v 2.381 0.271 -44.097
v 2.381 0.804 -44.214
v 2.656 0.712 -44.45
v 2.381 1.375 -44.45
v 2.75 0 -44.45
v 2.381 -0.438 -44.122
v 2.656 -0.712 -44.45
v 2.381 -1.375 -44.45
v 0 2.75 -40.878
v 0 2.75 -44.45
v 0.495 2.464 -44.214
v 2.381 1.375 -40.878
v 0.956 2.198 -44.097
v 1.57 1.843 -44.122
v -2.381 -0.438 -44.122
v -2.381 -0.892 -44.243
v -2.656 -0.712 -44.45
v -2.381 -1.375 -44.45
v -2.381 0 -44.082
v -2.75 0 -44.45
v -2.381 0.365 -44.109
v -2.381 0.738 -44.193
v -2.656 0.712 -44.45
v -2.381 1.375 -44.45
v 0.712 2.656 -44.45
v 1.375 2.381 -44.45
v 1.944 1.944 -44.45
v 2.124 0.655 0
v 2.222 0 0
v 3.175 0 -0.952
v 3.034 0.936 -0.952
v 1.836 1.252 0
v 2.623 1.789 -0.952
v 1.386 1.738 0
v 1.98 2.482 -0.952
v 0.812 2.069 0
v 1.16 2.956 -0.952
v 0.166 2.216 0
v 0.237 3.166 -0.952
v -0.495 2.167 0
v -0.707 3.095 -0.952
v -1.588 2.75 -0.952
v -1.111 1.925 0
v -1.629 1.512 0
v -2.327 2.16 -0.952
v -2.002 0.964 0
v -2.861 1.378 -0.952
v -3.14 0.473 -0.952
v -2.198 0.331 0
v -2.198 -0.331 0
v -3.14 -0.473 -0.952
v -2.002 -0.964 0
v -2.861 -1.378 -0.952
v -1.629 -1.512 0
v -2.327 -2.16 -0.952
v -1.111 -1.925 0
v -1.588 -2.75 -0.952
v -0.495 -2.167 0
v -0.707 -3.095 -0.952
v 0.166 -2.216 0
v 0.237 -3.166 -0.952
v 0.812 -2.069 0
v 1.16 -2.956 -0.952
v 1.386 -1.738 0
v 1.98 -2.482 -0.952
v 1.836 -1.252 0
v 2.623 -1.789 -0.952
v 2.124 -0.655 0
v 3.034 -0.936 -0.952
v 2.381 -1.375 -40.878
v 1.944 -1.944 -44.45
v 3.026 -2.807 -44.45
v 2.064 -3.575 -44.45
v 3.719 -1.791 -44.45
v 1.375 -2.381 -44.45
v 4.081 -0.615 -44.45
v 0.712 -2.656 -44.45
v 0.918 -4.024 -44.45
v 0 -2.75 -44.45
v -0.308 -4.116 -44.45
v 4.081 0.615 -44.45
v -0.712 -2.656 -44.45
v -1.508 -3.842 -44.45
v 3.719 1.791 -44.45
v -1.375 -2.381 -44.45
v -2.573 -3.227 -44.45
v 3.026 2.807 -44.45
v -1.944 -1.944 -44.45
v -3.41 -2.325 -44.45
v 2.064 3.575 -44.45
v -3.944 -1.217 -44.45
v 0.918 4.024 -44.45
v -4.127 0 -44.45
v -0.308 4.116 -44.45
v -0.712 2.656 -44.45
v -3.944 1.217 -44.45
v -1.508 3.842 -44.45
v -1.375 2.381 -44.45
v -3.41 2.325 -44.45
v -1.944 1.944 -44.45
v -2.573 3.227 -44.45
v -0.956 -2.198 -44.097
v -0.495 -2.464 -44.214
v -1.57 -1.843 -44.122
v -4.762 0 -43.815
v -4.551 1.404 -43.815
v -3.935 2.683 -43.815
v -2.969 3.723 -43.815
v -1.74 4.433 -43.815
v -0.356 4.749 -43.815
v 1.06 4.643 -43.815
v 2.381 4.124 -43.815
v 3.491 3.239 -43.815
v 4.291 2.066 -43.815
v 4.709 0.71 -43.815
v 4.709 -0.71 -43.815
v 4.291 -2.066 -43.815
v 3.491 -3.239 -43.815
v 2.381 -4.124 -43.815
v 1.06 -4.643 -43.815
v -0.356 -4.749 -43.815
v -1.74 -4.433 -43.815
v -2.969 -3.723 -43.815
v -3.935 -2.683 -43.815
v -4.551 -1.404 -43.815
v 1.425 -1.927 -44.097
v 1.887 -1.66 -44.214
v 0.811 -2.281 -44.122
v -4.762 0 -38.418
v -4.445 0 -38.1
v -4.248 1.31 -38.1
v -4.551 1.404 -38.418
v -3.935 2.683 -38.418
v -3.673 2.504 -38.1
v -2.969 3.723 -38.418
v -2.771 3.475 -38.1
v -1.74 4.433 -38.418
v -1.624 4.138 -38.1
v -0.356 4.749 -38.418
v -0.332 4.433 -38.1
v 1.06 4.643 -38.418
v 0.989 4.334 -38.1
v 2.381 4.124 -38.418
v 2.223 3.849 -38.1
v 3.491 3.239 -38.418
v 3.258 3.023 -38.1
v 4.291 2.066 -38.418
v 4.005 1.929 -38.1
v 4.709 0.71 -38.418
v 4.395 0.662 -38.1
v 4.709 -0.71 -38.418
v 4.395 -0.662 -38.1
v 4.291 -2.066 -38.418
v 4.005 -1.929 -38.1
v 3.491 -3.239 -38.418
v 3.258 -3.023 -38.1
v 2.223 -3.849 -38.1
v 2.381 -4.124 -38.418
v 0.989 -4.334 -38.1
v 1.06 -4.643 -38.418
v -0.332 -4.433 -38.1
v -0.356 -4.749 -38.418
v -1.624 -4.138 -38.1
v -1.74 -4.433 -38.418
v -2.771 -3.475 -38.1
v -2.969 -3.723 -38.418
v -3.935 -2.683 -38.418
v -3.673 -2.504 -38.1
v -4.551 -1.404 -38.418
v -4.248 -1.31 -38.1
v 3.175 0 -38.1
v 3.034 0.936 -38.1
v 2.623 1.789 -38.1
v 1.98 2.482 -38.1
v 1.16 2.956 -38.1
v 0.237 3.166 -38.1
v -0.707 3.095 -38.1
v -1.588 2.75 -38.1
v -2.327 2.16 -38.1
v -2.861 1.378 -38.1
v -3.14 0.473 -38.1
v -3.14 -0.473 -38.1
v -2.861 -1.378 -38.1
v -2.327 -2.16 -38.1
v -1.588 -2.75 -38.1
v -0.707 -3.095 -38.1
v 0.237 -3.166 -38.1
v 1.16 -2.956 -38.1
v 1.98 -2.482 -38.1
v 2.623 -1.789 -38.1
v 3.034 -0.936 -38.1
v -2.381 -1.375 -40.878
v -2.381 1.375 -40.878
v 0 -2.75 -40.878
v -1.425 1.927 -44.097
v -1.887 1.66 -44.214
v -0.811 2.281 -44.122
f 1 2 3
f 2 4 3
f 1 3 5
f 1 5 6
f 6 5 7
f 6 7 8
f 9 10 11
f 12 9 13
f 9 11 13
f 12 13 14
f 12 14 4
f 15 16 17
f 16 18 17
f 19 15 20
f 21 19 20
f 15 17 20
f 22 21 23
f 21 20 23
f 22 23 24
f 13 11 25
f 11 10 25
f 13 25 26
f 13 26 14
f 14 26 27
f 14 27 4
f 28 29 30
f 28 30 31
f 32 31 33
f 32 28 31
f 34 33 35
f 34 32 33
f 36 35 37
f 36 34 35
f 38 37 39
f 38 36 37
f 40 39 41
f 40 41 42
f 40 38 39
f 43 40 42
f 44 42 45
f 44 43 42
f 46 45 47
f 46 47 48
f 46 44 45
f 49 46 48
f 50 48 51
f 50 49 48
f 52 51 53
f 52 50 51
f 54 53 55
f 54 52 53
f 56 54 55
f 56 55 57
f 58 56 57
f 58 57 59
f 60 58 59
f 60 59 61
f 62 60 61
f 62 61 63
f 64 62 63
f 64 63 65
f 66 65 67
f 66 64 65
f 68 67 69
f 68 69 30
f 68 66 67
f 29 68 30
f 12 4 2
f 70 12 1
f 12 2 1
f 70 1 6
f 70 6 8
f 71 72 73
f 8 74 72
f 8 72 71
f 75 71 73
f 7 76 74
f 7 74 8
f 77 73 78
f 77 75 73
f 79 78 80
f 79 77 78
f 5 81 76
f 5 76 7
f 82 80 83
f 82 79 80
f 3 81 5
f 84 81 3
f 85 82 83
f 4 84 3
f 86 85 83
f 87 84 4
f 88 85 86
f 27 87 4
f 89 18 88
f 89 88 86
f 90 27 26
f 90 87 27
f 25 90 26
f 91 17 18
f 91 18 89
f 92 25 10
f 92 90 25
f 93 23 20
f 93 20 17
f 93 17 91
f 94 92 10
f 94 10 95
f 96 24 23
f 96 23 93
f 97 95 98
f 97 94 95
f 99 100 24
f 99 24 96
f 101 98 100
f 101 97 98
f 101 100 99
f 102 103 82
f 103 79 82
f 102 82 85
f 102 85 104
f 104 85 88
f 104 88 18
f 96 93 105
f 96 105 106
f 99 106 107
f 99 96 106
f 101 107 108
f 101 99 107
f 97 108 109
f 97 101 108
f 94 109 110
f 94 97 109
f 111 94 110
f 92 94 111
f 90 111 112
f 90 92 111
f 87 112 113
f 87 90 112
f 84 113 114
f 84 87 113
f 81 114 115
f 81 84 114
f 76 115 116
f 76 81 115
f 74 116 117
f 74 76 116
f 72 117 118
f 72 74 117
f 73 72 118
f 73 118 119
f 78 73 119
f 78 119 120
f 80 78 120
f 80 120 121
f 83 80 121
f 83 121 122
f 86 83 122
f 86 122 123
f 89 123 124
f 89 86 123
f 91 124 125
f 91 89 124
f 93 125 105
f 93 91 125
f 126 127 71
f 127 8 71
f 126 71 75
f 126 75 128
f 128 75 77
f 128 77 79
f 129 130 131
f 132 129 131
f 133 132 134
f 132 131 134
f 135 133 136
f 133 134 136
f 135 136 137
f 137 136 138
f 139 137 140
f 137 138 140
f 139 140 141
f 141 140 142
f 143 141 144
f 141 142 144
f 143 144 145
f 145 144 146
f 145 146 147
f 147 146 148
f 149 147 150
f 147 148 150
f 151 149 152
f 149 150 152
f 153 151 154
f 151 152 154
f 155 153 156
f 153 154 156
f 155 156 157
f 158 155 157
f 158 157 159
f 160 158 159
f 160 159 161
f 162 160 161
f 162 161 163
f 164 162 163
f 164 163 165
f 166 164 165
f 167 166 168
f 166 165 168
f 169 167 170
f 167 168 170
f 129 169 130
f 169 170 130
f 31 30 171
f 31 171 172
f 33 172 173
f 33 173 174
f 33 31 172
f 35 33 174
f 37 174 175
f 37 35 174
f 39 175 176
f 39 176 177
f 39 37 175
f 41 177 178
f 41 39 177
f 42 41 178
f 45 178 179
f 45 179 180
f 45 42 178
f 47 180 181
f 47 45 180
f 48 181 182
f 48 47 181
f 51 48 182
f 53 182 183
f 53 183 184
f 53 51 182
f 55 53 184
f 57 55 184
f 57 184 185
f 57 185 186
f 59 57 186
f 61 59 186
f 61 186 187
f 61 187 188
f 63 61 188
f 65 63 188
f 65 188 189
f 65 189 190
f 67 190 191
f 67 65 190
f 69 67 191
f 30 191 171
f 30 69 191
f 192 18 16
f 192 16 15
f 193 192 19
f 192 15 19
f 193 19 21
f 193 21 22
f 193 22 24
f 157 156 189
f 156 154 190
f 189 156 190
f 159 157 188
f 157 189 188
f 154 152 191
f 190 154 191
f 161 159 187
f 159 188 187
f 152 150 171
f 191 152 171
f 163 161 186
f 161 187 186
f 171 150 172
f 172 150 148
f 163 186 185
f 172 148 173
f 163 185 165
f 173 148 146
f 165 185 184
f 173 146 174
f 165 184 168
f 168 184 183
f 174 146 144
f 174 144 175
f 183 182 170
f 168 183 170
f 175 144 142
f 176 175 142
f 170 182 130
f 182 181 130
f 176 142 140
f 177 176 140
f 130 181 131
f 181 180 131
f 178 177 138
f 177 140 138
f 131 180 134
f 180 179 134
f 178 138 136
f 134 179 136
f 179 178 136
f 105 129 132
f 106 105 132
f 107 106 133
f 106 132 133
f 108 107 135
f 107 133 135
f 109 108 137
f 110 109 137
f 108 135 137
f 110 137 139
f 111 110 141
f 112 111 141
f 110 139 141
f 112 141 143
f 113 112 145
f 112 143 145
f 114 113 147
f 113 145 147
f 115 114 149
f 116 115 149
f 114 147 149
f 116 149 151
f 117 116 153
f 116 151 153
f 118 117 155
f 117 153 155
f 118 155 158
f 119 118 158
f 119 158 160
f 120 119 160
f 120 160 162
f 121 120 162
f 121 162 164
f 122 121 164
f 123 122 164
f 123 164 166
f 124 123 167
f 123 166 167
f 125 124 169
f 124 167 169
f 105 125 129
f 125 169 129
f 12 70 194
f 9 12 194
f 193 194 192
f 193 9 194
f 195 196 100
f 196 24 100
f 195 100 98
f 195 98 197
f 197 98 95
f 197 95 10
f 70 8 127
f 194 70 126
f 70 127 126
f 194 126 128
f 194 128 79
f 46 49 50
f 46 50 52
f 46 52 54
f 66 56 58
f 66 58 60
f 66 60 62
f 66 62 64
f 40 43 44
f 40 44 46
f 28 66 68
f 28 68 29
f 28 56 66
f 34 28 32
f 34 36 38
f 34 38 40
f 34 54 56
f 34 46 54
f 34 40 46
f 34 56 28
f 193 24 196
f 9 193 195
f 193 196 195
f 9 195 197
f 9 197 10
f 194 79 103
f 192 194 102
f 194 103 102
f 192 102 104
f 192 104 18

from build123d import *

# Parameters (mm, degrees)
SKETCH1_R          = 3.175
EXTRUDE1_DEPTH     = 38.1
SKETCH6_R          = 4.7625
EXTRUDE2_DEPTH     = 6.35
CUT_EXTRUDE1_DEPTH = 3.571875
SKETCH8_R          = 2.749630657
CUT_EXTRUDE2_DEPTH = 0.635
CUT_EXTRUDE2_DRAFT = -45
CHAMFER1_SIZE      = 0.635
CHAMFER2_SIZE      = 0.3175
CHAMFER3_SIZE      = 0.9525


with BuildPart() as part:
    # Sketch1 → Extrude1 (new body)
    with BuildSketch(Plane.XY):
        Circle(SKETCH1_R)
    extrude(amount=-EXTRUDE1_DEPTH)

    # Sketch6 → Extrude2 (add)
    with BuildSketch(Plane(origin=(0, 0, -38.1), x_dir=(-1, 0, 0), z_dir=(0, 0, -1))):
        Circle(SKETCH6_R)
    extrude(amount=EXTRUDE2_DEPTH)

    # Sketch7 → Cut-Extrude1 (cut)
    with BuildSketch(Plane(origin=(0, 0, -44.45), x_dir=(-1, 0, 0), z_dir=(0, 0, -1))):
        Polygon((0, 2.749630657), (-2.38125, 1.374815329), (-2.38125, -1.374815329), (0, -2.749630657), (2.38125, -1.374815329), (2.38125, 1.374815329), align=None)
    extrude(amount=-CUT_EXTRUDE1_DEPTH, mode=Mode.SUBTRACT)


with BuildPart() as cut_extrude2_tool:
    # Sketch8 → Cut-Extrude2 (with draft: the straight prism first)
    with BuildSketch(Plane(origin=(0, 0, -44.45), x_dir=(-1, 0, 0), z_dir=(0, 0, -1))):
        Circle(SKETCH8_R)
    extrude(amount=-CUT_EXTRUDE2_DEPTH)
    # Cut-Extrude2: the draft: its side faces are tilted about the plane it starts from
    cut_extrude2_sides = [cut_extrude2_tool.faces().sort_by_distance(p)[0] for p in [
        (2.749630657, 0, -44.1325),
    ]]
    draft(cut_extrude2_sides, Plane(origin=(0, 0, -44.45), x_dir=(-1, 0, 0), z_dir=(0, 0, -1)), CUT_EXTRUDE2_DRAFT)


with BuildPart() as part_1:
    add(part.part)

    # Cut-Extrude2: cut by cut_extrude2_tool
    add(cut_extrude2_tool.part, mode=Mode.SUBTRACT)

    # Chamfer1
    chamfer1_edges = [part_1.edges().sort_by_distance(p)[0] for p in [
        (4.7625, 0, -44.45),
    ]]
    chamfer(chamfer1_edges, length=CHAMFER1_SIZE)

    # Chamfer2
    chamfer2_edges = [part_1.edges().sort_by_distance(p)[0] for p in [
        (4.7625, 0, -38.1),
    ]]
    chamfer(chamfer2_edges, length=CHAMFER2_SIZE)

    # Chamfer3
    chamfer3_edges = [part_1.edges().sort_by_distance(p)[0] for p in [
        (-3.175, 0, 0),
    ]]
    chamfer(chamfer3_edges, length=CHAMFER3_SIZE)


solid = part_1.part
